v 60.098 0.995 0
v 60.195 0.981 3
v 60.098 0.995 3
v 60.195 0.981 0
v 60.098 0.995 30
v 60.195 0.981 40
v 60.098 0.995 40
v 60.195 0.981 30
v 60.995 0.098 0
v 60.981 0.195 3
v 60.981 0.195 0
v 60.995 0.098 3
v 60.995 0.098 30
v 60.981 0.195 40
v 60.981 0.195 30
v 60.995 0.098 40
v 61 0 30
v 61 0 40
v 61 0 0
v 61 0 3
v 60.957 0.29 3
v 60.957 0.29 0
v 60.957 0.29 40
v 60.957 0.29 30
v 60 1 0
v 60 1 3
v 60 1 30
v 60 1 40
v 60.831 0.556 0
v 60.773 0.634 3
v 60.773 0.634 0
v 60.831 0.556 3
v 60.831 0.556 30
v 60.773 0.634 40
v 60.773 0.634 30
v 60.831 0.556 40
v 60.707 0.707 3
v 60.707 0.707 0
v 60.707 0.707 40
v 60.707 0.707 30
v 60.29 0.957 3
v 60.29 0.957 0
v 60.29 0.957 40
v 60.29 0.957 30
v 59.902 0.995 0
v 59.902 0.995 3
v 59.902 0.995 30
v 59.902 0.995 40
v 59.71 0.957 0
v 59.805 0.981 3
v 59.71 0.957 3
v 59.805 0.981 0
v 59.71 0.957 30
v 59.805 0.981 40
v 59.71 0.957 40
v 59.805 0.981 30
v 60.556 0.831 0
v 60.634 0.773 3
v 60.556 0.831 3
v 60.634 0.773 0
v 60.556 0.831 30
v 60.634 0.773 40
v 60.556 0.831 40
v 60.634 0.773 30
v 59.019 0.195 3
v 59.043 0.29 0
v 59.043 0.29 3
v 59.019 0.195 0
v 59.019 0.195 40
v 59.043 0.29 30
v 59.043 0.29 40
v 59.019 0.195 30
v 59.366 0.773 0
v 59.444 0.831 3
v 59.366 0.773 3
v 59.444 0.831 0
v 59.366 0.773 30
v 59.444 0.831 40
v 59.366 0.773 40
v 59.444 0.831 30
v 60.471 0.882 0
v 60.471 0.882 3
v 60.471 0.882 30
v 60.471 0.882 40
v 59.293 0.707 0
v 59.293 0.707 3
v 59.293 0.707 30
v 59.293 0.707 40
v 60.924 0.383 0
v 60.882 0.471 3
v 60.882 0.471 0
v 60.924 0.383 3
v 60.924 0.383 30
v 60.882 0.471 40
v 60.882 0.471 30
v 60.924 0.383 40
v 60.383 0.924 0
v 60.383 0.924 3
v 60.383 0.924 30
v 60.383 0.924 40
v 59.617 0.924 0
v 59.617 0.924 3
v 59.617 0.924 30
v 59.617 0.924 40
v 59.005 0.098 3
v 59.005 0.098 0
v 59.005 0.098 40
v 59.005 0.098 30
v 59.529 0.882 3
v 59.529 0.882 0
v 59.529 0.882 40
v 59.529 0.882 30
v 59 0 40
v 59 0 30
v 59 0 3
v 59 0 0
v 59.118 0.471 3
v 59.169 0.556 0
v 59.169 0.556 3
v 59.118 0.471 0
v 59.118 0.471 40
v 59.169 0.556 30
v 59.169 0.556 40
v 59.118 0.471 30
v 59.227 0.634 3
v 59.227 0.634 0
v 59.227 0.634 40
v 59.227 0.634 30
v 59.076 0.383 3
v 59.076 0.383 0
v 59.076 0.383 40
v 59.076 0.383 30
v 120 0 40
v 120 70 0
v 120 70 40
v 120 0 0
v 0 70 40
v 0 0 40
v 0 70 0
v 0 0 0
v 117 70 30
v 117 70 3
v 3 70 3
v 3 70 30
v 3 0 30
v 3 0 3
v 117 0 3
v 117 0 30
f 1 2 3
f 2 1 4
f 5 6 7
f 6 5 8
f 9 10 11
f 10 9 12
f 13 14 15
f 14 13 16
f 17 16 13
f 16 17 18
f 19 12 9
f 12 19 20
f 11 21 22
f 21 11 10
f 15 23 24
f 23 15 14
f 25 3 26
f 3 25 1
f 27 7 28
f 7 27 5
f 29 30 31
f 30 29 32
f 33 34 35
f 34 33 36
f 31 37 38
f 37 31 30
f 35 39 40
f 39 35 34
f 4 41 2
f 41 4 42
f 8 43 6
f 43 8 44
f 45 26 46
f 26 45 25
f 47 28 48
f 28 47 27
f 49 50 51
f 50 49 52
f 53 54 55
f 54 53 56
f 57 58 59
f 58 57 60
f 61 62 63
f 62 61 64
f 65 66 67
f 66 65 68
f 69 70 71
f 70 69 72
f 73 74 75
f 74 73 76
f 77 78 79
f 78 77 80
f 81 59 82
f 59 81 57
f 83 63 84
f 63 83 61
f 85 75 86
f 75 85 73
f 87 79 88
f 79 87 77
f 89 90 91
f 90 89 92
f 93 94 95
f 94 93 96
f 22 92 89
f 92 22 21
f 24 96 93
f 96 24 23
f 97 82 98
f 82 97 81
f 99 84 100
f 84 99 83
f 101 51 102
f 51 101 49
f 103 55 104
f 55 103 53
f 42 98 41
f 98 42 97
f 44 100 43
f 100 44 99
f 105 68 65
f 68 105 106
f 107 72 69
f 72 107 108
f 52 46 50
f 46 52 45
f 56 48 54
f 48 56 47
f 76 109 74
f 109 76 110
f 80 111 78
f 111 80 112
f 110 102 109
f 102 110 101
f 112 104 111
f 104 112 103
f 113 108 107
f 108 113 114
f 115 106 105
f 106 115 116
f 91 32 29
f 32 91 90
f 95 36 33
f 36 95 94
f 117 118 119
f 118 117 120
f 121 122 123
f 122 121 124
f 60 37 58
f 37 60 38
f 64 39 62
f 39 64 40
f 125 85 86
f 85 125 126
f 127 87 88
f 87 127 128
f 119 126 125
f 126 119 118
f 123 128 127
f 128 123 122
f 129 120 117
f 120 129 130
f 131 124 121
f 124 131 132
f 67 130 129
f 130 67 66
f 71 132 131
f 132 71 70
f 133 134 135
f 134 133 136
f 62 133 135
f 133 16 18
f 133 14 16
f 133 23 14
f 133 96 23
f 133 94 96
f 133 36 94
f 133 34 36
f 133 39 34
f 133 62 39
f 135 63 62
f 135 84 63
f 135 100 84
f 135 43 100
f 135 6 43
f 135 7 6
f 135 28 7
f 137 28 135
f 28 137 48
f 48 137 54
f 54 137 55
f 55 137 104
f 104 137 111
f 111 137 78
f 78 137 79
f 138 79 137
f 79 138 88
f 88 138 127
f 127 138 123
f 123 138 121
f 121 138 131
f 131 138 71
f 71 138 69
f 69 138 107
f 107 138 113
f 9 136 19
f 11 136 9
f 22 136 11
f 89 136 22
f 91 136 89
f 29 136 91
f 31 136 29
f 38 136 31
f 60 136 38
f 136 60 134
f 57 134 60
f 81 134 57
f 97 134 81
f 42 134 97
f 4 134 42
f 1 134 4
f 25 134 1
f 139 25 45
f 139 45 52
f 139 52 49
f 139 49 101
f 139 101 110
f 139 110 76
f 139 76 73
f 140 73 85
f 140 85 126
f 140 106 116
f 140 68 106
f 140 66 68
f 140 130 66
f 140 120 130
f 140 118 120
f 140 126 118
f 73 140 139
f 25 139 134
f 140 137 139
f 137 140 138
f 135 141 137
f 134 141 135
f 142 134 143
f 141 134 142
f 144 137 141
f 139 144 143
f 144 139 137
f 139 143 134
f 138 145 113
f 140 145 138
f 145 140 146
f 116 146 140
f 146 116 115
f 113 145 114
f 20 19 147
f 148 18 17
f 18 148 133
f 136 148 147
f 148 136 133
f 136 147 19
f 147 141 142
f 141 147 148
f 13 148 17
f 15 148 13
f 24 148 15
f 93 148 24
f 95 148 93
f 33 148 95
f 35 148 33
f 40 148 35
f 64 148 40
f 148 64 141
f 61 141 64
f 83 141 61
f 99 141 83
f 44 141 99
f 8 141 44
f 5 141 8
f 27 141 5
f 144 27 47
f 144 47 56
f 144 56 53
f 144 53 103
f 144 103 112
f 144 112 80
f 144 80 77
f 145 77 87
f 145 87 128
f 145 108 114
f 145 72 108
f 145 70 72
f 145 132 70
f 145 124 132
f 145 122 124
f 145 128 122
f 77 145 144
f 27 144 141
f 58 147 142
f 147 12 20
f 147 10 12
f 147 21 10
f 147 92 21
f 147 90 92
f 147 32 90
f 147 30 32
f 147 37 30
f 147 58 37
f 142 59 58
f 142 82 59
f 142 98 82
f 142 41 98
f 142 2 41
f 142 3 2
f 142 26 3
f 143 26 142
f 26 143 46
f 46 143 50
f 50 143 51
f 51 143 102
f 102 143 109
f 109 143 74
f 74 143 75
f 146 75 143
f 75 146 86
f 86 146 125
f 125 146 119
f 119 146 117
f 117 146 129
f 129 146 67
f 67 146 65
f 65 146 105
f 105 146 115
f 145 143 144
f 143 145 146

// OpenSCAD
// Buffer tank for a mini horizontal gel-electrophoresis box. Open-top rectangular tank with a
// solid raised platform for the gel tray in the middle, dividing the bottom into two buffer
// chambers. Each end wall gets a horizontal 2 mm hole along X at y = 0, z = 30 for the
// electrode wires. NOVEL general part.
//

L   = 120;
W   = 70;
H   = 40;
wall = 3;
floor = 3;
platform_L = 60;
platform_z = 13;

$fn = 64;

inner_X = L - 2 * wall;
inner_Z = H - floor;

difference() {
    cube([L, W, H]);
    translate([wall, 0, floor]) cube([inner_X, W, H - platform_z]);   // floor + wall block (leaving the two chambers open above)
    translate([wall, W - 1, floor]) cube([inner_X, 1, H - platform_z]);  // upper wall between the chambers (open top)
    for (x = [-L / 2, L / 2])
        translate([x, 0, -1]) cylinder(h = H + 2, d = 2);                 // electrode holes through the end walls
}
